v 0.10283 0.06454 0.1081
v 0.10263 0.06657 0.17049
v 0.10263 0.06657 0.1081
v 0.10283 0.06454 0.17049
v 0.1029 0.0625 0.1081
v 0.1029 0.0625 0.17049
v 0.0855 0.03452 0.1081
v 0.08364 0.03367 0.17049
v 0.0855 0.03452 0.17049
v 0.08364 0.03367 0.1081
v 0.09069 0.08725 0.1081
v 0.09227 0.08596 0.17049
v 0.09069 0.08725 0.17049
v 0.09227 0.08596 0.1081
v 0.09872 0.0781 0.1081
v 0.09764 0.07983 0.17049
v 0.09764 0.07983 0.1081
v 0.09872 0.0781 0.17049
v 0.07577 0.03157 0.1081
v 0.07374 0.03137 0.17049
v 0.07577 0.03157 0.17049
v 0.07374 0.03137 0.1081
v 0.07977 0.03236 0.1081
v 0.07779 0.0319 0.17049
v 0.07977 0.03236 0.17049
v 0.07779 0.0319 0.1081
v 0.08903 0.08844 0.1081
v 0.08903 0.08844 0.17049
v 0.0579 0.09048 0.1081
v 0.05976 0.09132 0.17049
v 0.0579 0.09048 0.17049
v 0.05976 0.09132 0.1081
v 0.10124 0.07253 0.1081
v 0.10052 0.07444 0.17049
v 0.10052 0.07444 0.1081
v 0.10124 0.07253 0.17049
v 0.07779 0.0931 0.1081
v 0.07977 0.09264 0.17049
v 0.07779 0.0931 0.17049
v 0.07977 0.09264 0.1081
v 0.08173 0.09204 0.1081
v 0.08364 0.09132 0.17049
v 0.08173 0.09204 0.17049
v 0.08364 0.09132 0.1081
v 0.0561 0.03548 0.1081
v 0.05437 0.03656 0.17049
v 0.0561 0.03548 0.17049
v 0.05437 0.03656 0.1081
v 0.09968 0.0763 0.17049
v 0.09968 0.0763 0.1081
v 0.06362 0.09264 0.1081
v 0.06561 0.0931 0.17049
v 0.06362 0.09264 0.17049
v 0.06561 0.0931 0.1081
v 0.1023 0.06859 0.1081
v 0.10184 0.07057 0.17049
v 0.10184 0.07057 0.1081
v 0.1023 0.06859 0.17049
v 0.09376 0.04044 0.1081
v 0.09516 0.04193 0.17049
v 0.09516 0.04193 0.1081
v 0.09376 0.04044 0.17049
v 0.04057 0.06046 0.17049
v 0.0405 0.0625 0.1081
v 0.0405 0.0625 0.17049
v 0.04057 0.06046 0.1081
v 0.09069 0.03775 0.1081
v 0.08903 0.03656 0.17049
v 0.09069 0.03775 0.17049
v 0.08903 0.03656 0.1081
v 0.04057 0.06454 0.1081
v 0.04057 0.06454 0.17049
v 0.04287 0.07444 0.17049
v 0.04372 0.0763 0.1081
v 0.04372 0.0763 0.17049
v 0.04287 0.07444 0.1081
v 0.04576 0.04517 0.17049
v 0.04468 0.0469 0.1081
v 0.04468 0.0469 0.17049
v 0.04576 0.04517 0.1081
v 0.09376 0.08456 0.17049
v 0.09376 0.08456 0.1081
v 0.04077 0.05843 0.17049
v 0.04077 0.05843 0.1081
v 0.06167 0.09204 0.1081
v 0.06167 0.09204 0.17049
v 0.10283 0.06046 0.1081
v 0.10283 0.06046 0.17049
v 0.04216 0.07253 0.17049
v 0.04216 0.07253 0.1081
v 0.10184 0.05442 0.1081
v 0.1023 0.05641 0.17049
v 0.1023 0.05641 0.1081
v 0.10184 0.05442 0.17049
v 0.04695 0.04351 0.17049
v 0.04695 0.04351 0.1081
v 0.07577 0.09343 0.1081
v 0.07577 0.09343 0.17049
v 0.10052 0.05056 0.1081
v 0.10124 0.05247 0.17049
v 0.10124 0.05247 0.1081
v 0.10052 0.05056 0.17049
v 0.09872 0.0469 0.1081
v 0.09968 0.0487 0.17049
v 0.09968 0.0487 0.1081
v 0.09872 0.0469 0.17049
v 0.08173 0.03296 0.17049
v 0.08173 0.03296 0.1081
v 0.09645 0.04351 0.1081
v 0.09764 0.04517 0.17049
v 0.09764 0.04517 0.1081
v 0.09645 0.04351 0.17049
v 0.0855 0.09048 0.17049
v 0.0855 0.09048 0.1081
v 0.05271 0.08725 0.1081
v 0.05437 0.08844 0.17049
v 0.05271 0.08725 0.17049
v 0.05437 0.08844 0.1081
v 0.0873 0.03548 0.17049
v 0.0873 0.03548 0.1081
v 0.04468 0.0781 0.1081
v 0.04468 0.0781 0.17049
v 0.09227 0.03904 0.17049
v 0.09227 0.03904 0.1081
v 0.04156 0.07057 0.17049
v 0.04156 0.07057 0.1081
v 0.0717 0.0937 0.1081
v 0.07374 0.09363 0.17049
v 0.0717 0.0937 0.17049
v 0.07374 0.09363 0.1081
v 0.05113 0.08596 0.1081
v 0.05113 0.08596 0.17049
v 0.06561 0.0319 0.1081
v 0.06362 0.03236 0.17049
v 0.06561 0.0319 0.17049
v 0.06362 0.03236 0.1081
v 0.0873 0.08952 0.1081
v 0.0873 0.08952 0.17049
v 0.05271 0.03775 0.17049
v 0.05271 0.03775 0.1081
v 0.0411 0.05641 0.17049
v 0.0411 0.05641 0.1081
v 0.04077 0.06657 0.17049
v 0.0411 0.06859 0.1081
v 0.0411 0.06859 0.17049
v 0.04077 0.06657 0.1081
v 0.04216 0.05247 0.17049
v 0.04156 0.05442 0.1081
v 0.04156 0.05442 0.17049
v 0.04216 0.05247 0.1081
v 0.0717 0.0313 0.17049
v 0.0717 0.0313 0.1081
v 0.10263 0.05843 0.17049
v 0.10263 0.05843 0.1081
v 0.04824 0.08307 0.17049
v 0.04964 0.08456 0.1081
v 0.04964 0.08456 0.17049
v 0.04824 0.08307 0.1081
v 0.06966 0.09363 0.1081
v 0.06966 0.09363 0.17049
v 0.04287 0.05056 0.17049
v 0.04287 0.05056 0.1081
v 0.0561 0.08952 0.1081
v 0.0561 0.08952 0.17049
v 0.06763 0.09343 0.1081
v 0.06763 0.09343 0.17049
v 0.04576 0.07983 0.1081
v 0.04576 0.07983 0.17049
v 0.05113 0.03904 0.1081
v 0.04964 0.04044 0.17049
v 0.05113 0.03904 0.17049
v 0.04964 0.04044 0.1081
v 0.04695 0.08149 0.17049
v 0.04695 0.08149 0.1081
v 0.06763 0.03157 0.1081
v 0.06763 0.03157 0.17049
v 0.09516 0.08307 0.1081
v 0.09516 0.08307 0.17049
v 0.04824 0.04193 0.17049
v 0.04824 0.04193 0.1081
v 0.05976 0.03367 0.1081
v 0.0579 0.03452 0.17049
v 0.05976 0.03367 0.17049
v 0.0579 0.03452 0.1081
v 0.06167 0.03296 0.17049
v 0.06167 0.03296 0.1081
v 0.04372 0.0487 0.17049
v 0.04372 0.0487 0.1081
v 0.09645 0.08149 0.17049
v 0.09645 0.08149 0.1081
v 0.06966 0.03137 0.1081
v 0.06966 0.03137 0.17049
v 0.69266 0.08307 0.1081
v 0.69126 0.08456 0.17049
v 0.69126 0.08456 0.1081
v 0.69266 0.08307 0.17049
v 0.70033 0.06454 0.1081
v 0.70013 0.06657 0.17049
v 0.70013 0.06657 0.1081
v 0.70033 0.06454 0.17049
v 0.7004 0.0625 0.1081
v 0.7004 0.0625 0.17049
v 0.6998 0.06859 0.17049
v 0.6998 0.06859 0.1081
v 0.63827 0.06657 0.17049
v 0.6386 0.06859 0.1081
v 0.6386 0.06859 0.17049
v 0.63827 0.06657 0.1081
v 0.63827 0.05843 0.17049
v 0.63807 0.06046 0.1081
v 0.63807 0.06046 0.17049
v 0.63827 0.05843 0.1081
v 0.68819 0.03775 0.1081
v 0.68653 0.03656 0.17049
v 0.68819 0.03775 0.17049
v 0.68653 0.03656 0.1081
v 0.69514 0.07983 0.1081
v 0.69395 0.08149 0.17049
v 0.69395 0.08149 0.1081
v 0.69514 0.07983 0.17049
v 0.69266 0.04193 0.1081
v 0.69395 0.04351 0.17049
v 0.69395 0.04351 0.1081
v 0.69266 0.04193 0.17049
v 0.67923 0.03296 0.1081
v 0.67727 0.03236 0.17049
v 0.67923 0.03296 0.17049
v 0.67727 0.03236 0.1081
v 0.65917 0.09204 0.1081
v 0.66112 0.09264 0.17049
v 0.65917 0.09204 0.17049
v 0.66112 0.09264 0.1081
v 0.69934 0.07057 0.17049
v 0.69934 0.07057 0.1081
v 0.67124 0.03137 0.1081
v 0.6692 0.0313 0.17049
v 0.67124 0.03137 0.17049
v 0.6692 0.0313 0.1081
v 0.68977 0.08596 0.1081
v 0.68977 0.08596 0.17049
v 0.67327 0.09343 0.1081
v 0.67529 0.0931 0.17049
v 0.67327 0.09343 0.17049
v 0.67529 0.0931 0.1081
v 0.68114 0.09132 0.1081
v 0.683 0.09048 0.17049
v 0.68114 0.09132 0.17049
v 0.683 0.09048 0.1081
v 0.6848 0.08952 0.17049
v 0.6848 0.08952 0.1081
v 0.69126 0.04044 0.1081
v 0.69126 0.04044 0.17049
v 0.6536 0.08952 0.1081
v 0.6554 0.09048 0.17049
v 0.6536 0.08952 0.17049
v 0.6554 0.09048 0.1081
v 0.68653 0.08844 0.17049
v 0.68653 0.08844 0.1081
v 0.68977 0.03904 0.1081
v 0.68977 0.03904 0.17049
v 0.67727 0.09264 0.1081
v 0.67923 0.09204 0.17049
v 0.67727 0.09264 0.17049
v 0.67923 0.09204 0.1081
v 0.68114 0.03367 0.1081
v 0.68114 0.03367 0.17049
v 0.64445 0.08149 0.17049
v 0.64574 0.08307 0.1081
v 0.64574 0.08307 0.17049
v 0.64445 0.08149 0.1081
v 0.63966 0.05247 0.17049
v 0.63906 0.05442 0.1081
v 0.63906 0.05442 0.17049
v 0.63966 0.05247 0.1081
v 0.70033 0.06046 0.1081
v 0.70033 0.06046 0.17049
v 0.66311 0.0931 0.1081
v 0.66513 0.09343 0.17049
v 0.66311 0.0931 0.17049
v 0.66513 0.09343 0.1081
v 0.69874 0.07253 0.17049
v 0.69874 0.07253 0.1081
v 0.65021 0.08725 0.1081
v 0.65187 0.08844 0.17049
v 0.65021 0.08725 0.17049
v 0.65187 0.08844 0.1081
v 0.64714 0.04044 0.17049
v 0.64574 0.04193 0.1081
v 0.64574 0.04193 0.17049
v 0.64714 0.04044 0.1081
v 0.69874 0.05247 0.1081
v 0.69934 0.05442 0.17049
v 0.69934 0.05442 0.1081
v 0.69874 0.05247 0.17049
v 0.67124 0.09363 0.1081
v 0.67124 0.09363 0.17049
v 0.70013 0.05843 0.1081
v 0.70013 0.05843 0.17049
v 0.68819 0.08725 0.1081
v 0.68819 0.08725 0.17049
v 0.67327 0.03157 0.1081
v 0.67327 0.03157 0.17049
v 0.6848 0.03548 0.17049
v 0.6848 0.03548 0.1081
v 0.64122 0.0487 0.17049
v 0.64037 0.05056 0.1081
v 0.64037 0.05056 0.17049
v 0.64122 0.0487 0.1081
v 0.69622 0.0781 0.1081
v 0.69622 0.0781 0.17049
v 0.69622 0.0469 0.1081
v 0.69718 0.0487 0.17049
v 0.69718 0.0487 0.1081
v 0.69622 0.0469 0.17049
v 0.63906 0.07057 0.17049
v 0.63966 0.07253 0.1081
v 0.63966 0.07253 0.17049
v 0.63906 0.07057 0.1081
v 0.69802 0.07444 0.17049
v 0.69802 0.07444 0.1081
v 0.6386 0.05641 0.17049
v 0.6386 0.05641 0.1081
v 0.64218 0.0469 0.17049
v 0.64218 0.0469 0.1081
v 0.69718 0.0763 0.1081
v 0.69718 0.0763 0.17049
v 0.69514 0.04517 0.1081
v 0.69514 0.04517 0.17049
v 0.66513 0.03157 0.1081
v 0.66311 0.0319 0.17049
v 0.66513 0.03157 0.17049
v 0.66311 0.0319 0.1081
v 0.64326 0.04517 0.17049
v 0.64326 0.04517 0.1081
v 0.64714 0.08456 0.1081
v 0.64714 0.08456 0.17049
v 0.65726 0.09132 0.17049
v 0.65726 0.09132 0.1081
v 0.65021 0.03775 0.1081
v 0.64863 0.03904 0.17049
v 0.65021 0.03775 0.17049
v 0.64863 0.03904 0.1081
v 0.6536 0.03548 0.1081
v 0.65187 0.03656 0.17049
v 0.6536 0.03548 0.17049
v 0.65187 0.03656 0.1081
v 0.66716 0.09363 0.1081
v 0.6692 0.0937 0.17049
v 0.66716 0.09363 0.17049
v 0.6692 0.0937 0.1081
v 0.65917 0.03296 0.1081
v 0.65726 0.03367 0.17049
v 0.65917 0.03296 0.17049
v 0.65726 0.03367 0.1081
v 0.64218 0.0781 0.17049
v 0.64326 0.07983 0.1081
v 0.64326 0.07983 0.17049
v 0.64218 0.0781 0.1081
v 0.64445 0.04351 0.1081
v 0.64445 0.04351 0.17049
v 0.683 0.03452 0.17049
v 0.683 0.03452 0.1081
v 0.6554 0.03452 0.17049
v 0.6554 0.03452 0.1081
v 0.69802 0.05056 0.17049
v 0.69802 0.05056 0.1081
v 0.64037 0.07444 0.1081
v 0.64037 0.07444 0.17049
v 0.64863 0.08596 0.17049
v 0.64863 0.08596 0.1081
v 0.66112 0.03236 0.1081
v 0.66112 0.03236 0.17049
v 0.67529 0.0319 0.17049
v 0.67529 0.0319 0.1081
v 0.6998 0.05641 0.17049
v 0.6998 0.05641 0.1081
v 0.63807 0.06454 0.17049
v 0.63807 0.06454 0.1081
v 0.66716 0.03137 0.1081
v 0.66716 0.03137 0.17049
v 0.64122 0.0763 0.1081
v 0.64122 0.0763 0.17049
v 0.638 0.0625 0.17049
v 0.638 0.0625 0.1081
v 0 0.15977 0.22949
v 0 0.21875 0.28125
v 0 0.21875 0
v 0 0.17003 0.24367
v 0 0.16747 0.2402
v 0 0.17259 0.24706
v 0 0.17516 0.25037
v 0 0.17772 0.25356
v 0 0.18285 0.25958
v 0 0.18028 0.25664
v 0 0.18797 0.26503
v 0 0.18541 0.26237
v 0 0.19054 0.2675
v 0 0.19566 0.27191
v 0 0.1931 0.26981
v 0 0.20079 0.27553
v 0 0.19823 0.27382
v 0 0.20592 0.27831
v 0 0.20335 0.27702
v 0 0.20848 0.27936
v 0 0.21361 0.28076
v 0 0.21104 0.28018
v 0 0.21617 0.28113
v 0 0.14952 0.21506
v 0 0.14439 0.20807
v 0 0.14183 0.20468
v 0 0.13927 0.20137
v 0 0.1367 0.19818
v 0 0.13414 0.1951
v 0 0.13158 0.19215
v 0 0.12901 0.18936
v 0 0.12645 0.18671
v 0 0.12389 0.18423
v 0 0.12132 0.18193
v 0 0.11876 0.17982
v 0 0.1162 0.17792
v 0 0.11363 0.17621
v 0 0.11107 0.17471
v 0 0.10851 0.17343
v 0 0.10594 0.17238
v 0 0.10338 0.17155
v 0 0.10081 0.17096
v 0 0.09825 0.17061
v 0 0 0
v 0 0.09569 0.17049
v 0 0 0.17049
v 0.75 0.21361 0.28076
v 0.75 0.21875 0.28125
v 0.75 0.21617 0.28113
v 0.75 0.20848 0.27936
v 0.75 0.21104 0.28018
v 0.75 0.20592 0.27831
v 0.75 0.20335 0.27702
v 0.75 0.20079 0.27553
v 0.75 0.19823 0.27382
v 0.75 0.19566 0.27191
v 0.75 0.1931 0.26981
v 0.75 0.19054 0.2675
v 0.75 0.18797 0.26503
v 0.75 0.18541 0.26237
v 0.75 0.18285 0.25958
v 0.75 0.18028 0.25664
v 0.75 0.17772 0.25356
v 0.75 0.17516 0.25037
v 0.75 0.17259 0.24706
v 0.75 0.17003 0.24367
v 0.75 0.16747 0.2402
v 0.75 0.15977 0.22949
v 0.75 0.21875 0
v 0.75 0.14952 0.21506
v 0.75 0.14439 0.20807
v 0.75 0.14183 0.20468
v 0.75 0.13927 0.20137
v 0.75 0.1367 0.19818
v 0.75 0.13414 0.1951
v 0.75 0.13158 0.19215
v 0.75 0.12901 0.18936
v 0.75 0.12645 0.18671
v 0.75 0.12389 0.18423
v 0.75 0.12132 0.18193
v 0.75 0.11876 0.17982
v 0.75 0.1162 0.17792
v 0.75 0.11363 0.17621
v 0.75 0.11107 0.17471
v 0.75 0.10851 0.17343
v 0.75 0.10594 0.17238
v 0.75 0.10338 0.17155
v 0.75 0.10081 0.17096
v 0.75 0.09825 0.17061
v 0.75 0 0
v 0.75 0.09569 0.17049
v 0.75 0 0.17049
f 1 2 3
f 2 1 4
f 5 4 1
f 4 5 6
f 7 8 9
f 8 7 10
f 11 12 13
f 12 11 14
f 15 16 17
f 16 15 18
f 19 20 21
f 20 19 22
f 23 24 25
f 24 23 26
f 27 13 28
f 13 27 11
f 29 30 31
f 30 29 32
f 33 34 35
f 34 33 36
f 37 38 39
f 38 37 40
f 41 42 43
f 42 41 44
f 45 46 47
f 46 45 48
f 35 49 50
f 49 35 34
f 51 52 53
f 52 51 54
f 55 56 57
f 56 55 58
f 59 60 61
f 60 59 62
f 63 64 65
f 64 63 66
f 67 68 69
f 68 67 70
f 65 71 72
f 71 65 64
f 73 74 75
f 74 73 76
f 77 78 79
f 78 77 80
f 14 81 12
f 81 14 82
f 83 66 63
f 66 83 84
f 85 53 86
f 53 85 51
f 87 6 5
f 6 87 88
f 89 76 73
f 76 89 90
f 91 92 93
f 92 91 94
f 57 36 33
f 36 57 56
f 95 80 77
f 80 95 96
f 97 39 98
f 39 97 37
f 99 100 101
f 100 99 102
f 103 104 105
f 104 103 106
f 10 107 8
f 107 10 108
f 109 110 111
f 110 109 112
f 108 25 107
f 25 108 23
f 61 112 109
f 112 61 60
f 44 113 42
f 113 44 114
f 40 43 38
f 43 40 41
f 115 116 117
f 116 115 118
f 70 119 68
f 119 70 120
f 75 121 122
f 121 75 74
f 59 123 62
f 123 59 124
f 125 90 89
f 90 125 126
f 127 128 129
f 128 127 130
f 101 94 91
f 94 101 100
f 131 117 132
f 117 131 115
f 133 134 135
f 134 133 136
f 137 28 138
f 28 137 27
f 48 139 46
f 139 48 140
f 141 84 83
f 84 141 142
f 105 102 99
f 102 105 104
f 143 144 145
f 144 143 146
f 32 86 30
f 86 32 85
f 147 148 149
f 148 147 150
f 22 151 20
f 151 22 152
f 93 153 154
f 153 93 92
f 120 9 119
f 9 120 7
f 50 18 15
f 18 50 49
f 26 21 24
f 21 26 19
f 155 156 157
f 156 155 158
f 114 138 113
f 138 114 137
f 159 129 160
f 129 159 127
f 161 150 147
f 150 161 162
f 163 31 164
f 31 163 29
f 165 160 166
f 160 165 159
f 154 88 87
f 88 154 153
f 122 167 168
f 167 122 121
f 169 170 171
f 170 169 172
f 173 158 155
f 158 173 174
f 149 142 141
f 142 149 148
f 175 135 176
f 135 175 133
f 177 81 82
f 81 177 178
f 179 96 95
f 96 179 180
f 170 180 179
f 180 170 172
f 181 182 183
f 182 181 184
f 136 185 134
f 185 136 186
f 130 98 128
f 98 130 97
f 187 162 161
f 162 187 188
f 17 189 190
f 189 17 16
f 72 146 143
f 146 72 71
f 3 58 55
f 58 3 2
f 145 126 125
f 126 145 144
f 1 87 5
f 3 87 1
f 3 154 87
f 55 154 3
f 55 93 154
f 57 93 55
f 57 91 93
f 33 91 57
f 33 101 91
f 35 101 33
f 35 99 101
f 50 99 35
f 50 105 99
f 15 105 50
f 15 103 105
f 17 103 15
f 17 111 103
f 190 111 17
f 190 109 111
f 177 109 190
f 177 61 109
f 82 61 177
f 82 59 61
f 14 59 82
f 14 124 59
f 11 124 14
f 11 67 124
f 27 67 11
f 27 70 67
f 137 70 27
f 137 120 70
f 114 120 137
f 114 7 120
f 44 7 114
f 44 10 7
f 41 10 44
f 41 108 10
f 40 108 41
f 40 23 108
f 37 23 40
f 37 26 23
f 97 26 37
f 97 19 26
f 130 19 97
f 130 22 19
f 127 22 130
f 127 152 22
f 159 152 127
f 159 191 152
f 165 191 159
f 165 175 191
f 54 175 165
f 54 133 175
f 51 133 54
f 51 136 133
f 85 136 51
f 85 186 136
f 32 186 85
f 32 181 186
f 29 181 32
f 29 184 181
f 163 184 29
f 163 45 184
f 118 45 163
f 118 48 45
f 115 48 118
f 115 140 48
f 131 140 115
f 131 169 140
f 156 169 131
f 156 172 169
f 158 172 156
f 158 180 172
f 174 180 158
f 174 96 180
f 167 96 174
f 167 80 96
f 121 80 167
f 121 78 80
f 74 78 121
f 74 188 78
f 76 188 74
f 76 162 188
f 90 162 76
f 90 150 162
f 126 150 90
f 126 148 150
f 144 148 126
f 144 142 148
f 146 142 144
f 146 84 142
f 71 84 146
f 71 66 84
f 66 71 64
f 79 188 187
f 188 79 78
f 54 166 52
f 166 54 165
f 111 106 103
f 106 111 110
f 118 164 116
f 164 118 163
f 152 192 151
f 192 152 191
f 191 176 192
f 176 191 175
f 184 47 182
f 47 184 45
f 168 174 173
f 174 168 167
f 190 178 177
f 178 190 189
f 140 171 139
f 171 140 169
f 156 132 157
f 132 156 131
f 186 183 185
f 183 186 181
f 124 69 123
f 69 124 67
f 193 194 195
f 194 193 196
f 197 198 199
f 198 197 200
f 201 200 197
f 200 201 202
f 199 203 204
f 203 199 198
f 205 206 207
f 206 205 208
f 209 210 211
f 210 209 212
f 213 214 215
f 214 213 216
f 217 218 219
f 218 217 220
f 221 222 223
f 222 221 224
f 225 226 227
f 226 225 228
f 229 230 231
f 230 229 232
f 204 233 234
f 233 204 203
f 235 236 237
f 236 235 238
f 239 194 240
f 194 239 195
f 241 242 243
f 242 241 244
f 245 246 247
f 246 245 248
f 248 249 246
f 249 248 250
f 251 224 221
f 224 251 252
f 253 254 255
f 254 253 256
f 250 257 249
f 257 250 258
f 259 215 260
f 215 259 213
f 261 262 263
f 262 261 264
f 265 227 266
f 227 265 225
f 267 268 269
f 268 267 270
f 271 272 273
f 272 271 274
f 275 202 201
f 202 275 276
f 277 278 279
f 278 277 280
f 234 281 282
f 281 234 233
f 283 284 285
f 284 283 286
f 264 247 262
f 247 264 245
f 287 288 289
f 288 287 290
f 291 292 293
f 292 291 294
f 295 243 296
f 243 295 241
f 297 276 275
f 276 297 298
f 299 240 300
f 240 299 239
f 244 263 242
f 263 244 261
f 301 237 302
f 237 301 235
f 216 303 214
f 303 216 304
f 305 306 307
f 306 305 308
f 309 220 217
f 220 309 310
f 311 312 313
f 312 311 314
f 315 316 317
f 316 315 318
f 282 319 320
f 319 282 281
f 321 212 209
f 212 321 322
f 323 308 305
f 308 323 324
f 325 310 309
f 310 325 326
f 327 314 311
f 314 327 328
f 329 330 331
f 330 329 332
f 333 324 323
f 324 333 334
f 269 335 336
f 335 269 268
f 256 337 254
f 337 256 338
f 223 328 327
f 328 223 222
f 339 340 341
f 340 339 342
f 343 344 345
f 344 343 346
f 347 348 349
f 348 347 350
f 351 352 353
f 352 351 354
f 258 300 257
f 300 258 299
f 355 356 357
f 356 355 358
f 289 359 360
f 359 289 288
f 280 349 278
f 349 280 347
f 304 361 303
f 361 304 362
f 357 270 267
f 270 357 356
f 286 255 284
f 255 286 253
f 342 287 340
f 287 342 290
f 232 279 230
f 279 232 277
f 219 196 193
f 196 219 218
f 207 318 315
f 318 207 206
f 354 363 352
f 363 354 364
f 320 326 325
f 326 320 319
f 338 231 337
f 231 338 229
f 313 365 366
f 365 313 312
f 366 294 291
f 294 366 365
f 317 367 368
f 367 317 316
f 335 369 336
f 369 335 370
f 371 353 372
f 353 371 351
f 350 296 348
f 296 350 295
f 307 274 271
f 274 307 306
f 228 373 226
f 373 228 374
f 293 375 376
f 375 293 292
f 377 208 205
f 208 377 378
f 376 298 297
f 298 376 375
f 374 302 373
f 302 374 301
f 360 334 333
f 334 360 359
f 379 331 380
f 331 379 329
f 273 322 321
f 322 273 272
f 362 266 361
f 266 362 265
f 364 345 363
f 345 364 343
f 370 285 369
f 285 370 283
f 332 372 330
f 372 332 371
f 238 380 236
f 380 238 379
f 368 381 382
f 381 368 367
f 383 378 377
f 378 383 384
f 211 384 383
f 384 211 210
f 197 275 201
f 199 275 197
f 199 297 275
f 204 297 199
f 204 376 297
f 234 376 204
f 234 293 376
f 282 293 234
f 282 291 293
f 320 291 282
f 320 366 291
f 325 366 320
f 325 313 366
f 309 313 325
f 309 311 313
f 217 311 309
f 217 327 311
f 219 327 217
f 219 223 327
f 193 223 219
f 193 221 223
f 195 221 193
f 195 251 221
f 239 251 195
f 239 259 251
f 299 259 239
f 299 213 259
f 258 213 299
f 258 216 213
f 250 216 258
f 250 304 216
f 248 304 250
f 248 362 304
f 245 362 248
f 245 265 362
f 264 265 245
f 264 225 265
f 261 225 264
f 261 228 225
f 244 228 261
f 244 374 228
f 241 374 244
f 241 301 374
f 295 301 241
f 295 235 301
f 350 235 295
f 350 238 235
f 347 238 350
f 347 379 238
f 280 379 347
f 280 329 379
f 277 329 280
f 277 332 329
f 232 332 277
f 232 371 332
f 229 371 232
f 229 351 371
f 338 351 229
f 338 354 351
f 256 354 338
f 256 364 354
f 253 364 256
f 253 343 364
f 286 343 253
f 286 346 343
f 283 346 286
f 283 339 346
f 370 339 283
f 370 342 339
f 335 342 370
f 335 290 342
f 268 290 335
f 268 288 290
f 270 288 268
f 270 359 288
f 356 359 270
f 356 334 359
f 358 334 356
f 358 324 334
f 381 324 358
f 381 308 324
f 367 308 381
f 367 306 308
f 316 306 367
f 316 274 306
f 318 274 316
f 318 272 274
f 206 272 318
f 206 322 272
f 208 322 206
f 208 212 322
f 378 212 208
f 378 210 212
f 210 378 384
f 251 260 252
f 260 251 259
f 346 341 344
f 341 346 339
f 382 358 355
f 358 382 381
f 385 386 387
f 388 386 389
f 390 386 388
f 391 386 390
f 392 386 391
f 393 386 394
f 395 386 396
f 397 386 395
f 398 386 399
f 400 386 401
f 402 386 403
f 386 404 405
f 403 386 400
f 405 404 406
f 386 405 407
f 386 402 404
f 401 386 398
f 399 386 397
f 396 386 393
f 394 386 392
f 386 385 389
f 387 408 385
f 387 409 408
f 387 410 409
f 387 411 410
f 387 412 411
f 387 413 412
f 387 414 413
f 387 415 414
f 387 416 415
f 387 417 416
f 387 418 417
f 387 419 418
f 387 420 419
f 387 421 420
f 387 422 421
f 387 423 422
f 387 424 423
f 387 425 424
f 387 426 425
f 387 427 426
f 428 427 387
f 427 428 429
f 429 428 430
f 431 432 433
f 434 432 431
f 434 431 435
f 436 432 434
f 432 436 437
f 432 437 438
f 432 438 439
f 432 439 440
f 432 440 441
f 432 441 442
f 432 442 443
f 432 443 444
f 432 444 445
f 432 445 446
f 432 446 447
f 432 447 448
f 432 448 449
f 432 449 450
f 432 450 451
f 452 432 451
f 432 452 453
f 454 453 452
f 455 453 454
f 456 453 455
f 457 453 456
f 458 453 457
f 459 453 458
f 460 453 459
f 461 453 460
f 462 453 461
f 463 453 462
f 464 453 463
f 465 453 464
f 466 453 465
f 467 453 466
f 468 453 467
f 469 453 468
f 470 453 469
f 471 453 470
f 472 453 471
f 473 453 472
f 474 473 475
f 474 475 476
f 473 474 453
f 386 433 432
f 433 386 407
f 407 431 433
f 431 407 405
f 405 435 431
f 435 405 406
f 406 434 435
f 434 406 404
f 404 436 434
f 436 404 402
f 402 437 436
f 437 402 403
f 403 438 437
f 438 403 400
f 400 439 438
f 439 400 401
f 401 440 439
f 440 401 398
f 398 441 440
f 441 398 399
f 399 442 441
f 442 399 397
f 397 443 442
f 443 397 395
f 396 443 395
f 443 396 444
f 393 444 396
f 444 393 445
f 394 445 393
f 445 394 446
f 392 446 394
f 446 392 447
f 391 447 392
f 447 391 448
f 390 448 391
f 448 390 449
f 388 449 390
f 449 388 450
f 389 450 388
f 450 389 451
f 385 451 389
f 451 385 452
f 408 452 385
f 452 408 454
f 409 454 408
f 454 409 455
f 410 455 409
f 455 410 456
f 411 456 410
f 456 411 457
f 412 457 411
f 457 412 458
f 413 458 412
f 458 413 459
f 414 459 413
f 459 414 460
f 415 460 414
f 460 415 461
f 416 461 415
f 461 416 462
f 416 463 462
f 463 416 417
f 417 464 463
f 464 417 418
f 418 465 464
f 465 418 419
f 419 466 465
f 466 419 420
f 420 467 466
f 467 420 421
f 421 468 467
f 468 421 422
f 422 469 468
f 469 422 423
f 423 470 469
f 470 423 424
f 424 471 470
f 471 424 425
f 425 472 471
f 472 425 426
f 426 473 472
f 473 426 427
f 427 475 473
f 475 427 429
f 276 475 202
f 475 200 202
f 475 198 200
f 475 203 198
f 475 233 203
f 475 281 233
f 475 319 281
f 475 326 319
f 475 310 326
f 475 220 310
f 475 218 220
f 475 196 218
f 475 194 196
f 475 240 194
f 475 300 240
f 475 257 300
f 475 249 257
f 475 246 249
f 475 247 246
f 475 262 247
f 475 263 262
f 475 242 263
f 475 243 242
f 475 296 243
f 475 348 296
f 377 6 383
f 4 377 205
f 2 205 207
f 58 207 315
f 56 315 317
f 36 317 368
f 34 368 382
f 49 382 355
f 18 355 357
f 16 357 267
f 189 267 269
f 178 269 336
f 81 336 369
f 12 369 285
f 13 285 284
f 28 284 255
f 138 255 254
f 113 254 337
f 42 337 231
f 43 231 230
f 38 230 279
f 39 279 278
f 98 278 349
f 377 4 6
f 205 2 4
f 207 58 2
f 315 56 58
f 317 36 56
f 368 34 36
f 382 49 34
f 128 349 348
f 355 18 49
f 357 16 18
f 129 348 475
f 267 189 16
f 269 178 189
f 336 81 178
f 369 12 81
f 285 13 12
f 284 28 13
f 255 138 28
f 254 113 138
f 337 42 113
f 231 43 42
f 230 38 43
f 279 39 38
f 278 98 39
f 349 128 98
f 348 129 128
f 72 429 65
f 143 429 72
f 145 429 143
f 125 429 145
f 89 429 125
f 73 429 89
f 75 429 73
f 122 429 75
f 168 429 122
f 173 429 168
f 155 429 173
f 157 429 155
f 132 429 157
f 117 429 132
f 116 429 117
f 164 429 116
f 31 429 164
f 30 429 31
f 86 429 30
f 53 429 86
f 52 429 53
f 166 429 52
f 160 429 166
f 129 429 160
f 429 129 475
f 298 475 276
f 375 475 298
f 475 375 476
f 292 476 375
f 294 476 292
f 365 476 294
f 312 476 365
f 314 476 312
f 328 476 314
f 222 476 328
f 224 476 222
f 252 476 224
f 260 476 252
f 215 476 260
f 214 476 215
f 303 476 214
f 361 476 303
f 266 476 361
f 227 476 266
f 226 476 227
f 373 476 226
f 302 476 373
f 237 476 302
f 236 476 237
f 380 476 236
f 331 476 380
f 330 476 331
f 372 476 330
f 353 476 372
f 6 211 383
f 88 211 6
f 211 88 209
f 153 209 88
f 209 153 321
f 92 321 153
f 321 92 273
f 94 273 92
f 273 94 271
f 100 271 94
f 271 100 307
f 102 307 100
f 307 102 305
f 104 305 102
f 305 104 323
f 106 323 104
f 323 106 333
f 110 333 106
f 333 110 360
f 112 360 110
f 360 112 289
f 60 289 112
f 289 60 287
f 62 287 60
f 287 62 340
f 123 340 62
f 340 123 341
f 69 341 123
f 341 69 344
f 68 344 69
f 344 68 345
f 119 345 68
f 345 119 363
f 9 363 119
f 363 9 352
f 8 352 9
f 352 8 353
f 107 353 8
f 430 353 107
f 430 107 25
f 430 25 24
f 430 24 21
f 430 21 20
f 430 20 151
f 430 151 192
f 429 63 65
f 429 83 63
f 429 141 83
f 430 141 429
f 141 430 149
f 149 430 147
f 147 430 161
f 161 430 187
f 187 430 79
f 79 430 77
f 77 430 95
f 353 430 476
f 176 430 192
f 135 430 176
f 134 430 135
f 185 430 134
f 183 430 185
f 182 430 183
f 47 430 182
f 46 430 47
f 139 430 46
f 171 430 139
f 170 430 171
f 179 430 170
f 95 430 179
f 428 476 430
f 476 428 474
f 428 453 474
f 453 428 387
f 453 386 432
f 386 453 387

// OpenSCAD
// Parameters
$fn = 96;
eps = 0.0005;

base_length = 0.75;
base_width = 0.21875;
base_height_declared = 0.28125;
main_extrusion_depth = 0.2812;
base_height = max(base_height_declared, main_extrusion_depth);

hole_radius = 0.0312;
hole1_x = 0.0717;
hole2_x = 0.6692;
hole_y = 0.0625;

cut_z_bottom = 0.1081;
cut_z_top = 0.1705;
cut_depth_nominal = 0.0625;
cut_depth = cut_z_top - cut_z_bottom;

arch_steps = 48;
flat_clearance = 0.002;
front_flat_depth = hole_y + hole_radius + flat_clearance;

pattern_envelope_length = (hole2_x + hole_radius) - (hole1_x - hole_radius);
pattern_envelope_width = 2 * hole_radius;

// Helpers
function clamp01(t) = min(1, max(0, t));
function arch_lift(t) = (1 - cos(180 * clamp01(t))) / 2;
function side_top_z(y) =
    y <= front_flat_depth
    ? cut_z_top
    : cut_z_top + (base_height - cut_z_top) *
      arch_lift((y - front_flat_depth) / (base_width - front_flat_depth));

function side_profile_points() =
    concat(
        [[0, 0], [base_width, 0], [base_width, base_height]],
        [for (i = [arch_steps - 1 : -1 : 0])
            let (
                t = i / arch_steps,
                y = front_flat_depth + t * (base_width - front_flat_depth)
            )
            [y, side_top_z(y)]
        ],
        [[0, cut_z_top]]
    );

// Extrude local Y-Z profile along global X
module extrude_along_x(len) {
    multmatrix([
        [0, 0, 1, 0],
        [1, 0, 0, 0],
        [0, 1, 0, 0],
        [0, 0, 0, 1]
    ])
    linear_extrude(height=len, convexity=10)
        children();
}

// Main arched base
module arched_base() {
    extrude_along_x(base_length)
        polygon(points=side_profile_points());
}

// One circular blind cut profile
module circular_blind_cut(xpos) {
    translate([xpos, hole_y, cut_z_bottom])
        cylinder(h=cut_depth + eps, r=hole_radius, center=false);
}

// Two separate circular profiles only
module two_circle_remove_feature() {
    circular_blind_cut(hole1_x);
    circular_blind_cut(hole2_x);
}

// Model
difference() {
    arched_base();
    two_circle_remove_feature();
}
